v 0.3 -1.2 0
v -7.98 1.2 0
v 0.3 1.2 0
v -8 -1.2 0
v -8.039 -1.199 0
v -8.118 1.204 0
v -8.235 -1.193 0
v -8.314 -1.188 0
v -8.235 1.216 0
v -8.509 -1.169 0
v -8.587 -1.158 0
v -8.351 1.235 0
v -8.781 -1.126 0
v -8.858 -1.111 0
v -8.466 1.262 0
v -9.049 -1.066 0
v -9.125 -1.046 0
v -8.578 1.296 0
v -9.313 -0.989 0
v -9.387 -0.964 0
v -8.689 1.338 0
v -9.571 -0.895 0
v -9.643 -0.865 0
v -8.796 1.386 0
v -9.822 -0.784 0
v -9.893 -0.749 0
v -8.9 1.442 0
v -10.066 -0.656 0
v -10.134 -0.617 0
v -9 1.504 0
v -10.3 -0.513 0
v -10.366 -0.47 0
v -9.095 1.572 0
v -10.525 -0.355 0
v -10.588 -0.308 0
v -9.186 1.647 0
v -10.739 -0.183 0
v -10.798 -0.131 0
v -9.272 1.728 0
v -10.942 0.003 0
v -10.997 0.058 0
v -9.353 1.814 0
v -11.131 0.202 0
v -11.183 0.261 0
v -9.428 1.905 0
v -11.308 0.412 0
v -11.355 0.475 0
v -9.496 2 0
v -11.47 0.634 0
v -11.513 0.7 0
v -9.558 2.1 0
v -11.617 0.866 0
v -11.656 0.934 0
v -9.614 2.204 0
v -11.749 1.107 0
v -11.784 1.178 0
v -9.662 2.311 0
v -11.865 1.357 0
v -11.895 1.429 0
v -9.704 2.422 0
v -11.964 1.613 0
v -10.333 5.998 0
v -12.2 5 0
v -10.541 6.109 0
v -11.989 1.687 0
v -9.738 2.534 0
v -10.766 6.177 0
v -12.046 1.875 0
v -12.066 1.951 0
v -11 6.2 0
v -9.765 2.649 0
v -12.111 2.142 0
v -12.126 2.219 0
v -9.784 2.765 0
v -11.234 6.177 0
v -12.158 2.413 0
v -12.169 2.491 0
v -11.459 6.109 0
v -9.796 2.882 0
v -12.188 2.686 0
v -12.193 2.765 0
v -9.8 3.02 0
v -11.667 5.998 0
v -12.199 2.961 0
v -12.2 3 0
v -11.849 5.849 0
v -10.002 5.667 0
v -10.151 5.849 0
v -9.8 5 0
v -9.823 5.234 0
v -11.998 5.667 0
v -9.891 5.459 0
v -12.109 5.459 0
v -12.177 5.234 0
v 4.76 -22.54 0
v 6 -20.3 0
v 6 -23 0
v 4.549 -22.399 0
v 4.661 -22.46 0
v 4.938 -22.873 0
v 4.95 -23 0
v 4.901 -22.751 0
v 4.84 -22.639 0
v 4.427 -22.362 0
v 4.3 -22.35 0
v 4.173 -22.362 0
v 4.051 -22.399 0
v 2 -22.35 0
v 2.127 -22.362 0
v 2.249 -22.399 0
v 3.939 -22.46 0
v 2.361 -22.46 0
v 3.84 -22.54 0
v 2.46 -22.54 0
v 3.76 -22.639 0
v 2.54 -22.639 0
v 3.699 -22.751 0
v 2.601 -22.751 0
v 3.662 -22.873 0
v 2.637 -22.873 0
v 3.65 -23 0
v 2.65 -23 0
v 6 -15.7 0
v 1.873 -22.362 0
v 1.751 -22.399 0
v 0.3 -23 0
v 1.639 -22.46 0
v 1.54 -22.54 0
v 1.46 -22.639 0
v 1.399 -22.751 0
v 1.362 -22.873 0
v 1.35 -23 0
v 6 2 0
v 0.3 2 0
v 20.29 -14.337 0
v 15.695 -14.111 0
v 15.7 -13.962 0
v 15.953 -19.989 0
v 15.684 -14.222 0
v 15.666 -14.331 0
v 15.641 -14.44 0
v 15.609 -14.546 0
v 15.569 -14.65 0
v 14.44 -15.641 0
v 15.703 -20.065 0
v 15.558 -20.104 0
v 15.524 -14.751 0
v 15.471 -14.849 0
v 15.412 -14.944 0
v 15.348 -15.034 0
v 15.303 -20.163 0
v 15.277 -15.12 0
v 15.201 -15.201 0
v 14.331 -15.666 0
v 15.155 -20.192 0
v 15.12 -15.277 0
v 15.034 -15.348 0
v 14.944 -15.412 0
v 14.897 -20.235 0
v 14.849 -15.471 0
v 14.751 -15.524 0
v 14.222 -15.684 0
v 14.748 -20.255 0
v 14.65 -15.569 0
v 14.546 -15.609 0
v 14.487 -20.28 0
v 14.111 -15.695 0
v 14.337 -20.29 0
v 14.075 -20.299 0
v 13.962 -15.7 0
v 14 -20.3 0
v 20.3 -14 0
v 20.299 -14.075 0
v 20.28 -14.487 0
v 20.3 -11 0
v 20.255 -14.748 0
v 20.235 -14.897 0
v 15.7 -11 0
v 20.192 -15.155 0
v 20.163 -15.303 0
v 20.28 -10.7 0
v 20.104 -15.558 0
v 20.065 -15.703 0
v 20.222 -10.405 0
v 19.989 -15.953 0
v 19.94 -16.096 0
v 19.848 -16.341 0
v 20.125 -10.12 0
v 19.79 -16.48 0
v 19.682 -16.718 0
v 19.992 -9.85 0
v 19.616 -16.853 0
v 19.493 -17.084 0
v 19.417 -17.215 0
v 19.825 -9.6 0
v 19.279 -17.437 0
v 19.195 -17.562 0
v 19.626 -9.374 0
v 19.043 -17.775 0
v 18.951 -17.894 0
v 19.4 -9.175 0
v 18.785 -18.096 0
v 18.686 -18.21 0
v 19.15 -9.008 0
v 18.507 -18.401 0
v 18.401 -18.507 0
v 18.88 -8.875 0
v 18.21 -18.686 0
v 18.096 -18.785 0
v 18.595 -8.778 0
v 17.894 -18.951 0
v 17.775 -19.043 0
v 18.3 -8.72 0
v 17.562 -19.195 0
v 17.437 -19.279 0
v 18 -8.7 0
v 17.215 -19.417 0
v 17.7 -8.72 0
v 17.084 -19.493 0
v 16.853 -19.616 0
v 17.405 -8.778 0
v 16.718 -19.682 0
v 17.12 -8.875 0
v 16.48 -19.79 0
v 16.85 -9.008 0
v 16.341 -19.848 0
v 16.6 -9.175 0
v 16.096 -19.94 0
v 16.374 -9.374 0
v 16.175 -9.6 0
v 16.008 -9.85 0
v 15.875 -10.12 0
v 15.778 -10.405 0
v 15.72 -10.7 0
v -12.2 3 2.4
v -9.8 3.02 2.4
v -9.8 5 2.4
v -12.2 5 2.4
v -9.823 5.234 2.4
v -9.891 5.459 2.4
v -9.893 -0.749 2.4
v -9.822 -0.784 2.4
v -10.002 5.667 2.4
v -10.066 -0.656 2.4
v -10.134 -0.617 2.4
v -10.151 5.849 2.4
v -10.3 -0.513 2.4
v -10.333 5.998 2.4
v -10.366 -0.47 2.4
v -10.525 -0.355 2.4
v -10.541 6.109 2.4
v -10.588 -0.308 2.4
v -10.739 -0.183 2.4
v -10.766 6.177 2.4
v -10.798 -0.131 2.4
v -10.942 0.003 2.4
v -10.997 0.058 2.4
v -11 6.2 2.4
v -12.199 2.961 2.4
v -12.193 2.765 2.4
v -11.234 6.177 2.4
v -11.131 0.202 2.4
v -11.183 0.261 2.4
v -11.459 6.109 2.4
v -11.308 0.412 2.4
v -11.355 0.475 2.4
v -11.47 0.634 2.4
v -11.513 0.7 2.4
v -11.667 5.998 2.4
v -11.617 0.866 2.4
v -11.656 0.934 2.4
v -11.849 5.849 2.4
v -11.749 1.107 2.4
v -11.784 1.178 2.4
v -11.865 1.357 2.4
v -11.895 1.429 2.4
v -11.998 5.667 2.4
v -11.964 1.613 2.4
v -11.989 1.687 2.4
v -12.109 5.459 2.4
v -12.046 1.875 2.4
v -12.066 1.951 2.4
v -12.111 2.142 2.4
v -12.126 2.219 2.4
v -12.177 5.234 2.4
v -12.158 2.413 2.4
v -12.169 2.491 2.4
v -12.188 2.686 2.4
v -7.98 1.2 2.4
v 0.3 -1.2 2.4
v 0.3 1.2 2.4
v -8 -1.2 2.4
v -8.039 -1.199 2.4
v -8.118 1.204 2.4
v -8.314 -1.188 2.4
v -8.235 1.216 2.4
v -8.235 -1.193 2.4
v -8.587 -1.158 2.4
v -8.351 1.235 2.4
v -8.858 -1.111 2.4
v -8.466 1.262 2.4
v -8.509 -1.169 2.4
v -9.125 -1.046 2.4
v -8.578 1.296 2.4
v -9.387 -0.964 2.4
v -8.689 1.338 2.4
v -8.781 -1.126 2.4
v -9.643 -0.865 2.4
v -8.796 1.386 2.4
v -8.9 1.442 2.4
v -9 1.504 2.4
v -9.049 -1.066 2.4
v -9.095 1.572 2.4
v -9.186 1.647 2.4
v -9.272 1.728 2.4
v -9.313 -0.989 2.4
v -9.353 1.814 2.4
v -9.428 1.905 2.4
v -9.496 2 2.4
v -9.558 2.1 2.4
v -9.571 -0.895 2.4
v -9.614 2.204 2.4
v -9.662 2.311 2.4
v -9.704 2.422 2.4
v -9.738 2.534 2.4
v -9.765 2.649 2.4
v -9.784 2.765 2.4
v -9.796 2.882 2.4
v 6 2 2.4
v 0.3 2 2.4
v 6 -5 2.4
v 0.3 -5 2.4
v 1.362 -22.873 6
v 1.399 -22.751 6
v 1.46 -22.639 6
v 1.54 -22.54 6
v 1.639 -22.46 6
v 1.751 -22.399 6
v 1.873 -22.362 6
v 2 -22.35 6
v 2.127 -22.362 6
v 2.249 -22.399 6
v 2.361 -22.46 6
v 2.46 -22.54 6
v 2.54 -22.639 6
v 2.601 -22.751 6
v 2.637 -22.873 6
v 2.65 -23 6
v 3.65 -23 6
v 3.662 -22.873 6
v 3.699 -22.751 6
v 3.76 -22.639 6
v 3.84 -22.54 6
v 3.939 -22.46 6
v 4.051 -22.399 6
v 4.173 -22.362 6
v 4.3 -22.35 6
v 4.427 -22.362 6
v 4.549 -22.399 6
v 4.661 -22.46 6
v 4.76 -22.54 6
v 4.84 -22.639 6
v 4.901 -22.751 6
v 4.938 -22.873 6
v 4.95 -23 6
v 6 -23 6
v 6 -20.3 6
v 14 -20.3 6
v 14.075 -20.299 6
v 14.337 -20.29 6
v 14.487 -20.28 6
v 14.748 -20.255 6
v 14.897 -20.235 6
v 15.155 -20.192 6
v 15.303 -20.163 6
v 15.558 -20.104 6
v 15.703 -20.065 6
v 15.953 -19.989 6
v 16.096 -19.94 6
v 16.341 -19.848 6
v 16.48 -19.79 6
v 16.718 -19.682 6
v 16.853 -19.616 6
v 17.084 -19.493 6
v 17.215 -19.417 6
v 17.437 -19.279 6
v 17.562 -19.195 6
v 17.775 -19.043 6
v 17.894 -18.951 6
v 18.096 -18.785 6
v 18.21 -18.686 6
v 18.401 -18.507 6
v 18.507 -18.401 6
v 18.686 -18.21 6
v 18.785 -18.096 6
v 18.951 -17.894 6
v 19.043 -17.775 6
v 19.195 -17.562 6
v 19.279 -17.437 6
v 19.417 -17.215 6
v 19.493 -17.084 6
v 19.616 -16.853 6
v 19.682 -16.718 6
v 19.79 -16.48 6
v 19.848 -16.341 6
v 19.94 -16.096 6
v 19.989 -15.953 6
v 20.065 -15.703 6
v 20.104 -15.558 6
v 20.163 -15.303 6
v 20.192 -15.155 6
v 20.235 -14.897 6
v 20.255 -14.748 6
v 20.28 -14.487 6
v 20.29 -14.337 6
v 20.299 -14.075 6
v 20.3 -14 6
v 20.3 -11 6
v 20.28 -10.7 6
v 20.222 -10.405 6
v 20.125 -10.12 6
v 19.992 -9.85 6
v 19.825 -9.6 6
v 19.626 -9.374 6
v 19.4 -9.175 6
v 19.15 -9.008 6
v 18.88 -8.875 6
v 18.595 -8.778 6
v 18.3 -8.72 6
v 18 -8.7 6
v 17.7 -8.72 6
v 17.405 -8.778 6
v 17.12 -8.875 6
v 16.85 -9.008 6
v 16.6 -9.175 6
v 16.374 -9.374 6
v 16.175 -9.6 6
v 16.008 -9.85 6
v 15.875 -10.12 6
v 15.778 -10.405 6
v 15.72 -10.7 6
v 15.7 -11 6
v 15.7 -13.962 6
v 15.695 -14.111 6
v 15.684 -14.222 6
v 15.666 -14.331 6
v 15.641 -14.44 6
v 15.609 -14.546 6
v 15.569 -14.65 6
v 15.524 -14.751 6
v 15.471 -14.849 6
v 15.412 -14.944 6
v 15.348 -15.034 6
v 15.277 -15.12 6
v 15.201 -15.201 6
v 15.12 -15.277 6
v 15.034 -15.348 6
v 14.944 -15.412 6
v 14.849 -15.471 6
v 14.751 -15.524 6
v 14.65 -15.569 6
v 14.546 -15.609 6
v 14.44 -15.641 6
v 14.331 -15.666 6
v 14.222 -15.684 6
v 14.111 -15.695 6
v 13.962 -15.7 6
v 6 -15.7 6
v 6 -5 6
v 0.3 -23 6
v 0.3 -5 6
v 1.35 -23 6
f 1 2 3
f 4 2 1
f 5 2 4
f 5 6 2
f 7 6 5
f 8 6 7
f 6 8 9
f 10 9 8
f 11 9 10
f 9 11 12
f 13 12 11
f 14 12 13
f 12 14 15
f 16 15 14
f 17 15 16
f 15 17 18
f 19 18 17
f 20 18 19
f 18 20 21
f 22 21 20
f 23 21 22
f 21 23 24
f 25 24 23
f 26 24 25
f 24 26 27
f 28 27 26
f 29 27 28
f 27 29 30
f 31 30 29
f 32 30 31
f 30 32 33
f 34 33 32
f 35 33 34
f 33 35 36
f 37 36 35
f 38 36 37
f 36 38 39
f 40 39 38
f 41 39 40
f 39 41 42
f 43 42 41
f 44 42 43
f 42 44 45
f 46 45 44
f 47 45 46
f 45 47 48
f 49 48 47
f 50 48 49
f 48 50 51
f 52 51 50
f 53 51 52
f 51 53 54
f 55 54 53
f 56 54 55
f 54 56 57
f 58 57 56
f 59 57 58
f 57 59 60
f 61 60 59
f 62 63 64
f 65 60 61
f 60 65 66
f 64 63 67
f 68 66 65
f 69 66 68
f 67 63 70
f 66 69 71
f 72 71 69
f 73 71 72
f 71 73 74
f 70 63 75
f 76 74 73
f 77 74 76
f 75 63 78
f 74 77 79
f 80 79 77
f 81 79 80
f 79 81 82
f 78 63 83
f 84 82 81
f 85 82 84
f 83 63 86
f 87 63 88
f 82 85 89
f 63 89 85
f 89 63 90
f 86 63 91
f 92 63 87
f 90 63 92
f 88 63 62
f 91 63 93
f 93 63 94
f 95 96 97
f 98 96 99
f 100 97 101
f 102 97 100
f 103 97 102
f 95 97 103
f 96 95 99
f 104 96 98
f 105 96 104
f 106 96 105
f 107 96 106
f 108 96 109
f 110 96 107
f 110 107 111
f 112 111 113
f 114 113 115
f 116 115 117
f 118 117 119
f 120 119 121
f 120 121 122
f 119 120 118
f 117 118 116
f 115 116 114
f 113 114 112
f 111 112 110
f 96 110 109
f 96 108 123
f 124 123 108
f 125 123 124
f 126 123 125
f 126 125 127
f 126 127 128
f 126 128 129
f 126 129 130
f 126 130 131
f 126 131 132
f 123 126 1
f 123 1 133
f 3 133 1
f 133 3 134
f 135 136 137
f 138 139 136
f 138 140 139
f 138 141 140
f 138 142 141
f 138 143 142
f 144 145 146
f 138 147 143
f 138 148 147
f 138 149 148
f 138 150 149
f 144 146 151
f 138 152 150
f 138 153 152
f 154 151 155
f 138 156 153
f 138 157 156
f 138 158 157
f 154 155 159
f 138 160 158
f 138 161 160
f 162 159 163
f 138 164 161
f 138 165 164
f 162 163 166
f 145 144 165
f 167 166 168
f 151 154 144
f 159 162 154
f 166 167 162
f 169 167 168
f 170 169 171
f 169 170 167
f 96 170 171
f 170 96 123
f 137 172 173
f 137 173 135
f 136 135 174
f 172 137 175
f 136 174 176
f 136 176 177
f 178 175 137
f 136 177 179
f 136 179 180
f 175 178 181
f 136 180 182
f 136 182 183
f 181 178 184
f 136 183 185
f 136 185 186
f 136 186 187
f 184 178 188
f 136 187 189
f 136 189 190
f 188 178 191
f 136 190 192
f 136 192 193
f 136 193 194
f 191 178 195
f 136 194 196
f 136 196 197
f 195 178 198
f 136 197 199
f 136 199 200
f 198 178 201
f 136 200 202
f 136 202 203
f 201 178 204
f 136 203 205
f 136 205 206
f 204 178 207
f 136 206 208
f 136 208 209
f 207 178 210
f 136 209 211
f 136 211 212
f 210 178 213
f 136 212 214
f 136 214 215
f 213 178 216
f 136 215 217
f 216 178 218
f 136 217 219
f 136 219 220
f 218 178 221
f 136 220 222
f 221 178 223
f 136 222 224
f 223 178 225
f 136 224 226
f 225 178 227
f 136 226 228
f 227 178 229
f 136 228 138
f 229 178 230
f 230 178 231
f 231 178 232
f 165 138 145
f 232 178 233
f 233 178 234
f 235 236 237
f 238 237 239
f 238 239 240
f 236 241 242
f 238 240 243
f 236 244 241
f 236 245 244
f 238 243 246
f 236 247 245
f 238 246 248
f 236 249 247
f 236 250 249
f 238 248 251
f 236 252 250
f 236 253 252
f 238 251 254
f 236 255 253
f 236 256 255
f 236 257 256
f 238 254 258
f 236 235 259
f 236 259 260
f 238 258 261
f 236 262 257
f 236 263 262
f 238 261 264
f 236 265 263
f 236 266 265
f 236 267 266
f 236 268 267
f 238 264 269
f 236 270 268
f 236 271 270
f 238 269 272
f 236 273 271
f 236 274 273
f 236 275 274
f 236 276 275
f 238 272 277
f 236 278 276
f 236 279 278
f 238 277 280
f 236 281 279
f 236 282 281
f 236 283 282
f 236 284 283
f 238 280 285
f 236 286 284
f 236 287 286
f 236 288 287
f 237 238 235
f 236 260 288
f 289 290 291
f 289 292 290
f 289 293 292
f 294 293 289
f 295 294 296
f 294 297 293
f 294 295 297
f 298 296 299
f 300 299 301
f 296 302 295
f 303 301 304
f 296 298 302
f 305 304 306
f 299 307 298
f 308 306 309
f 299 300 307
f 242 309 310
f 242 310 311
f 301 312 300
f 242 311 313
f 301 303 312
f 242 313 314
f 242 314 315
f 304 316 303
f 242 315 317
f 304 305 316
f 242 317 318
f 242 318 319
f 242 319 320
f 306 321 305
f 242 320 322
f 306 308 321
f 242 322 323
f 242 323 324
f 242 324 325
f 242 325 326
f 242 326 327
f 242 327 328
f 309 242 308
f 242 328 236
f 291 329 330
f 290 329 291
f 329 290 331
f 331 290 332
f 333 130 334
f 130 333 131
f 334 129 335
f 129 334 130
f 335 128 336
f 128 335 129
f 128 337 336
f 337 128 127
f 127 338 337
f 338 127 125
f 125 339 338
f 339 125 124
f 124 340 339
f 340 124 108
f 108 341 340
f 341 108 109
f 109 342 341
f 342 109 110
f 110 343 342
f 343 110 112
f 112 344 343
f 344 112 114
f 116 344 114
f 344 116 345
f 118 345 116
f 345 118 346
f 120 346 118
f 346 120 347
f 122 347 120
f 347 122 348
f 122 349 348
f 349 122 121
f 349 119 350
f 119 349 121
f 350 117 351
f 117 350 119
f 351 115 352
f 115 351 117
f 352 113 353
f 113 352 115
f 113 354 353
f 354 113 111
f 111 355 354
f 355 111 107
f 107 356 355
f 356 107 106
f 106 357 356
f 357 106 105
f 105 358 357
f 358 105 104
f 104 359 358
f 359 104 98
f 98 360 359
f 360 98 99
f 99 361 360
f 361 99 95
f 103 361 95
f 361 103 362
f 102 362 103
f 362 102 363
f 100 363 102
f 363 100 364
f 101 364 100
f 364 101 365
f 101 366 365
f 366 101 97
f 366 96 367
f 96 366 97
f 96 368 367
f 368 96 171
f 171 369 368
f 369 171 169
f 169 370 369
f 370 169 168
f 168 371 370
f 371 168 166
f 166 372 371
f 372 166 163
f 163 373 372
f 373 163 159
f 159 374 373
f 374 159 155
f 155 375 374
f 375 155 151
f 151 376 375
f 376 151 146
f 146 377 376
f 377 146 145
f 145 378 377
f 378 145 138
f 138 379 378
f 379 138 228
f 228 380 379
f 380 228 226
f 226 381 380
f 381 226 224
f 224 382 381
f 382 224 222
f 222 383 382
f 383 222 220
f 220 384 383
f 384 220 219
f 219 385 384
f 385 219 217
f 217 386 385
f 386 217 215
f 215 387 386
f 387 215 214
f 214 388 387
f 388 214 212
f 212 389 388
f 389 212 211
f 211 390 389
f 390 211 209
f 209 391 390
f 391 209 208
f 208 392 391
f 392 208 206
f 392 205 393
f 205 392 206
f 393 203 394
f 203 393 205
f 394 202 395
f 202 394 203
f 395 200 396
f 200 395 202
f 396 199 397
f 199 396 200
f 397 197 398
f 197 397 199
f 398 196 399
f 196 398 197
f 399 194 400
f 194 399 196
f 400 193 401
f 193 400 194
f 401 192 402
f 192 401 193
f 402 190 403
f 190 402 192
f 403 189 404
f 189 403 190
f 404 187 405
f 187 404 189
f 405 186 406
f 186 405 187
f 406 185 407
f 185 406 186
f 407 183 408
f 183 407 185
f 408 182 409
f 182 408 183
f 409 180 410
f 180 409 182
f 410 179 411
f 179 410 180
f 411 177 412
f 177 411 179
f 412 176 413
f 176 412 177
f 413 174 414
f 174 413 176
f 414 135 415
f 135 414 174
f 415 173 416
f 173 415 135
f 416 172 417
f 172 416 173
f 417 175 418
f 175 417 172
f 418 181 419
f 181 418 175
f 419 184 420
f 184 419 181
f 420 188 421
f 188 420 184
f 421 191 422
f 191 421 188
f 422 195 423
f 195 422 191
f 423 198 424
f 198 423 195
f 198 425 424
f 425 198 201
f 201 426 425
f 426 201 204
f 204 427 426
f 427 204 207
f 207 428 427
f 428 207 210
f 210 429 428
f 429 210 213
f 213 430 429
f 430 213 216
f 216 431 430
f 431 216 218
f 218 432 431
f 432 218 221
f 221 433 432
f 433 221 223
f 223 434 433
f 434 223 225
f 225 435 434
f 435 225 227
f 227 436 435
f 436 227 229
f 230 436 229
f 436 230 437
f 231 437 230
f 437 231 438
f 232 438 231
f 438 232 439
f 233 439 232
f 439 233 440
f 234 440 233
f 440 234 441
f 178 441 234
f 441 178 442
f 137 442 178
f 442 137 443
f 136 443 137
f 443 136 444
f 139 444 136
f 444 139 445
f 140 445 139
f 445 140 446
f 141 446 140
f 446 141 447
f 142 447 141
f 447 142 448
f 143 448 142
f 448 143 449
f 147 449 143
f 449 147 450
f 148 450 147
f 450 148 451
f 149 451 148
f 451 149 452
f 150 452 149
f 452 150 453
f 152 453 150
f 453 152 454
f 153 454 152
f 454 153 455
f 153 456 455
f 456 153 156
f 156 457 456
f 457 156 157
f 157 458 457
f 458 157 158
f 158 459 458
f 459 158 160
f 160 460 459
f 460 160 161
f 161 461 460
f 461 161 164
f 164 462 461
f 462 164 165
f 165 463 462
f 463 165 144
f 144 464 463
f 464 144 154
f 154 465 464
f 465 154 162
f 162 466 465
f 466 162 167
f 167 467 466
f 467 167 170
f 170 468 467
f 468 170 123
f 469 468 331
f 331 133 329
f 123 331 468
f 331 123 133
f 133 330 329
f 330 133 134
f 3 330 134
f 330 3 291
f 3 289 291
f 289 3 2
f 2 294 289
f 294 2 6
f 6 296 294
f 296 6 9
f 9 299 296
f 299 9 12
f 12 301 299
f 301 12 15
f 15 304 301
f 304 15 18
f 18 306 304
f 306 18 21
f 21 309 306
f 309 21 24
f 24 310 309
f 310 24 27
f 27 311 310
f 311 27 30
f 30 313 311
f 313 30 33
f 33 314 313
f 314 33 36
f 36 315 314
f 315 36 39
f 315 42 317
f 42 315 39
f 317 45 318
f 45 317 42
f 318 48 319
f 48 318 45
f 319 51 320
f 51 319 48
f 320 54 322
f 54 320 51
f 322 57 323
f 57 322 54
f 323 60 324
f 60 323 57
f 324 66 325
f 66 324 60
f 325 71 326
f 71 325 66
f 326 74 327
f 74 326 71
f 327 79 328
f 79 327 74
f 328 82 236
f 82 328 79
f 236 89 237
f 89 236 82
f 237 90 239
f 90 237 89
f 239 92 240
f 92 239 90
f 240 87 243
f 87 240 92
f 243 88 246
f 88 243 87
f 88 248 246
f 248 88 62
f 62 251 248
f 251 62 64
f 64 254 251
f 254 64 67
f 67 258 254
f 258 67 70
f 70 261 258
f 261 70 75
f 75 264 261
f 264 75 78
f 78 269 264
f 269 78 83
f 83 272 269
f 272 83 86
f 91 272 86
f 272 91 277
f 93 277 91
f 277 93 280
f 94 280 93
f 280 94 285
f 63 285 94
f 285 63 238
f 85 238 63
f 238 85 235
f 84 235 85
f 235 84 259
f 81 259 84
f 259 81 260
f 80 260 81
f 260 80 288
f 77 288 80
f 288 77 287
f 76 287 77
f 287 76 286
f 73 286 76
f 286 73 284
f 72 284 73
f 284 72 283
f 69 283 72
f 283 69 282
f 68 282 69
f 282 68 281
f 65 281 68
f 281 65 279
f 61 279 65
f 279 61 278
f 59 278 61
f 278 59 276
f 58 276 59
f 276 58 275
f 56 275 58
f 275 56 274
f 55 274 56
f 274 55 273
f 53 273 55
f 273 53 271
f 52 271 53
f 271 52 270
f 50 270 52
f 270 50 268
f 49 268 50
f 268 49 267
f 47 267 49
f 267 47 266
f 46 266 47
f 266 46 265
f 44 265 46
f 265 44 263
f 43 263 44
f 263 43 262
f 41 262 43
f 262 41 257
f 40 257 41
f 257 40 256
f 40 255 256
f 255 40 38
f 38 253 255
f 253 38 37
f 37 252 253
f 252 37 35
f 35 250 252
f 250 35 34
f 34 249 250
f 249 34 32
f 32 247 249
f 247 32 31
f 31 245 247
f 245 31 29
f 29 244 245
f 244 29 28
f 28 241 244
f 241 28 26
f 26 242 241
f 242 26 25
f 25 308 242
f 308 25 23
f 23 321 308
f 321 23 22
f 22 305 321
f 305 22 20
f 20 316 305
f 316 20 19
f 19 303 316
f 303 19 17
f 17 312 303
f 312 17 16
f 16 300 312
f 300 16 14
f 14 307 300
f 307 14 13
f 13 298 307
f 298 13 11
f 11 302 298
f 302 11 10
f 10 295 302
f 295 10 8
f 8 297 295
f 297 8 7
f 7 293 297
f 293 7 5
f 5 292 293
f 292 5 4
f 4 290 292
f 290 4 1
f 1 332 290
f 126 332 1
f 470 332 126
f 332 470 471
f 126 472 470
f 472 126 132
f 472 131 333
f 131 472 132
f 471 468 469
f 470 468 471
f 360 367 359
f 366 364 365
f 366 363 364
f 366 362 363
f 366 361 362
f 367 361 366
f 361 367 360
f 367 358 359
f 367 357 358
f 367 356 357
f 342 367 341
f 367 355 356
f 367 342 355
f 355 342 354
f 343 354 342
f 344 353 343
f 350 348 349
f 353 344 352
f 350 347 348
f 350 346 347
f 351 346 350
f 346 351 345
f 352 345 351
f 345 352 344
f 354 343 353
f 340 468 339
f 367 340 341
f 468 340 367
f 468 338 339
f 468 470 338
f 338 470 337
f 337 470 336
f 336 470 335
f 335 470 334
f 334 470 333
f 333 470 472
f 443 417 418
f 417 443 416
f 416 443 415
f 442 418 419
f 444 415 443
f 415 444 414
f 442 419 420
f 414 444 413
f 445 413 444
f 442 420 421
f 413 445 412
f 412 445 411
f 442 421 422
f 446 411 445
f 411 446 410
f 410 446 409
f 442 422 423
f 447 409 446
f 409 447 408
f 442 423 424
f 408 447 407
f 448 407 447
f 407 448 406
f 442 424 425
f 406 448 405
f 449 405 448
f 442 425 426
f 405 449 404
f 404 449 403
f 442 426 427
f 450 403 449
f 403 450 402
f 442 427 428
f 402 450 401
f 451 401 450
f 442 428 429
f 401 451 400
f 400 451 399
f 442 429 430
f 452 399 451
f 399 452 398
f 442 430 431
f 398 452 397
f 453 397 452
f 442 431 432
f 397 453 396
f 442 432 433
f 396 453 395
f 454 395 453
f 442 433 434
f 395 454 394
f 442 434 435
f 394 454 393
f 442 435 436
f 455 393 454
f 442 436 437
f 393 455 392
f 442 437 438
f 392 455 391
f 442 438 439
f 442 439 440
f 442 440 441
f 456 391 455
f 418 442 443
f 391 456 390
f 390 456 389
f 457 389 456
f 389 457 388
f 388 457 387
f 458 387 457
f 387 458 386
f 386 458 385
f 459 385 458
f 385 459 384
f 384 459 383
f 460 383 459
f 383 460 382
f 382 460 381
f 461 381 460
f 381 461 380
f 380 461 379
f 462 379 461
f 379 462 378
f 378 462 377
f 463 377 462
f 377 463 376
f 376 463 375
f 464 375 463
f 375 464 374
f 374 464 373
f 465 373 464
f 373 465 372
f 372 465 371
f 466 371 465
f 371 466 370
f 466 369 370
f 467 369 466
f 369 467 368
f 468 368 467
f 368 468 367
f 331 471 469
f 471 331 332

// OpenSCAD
// Experimental key hook. Side-down print. mm. No verified load rating.
union(){
linear_extrude(height=2.4) polygon(points=[[14.331413174985244, -15.666126542813972], [14.439673483531255, -15.640883779279488], [14.546051042720913, -15.60861449948906], [14.650090327514404, -15.569456885452816], [14.75134582572176, -15.52357861608567], [14.84938394575467, -15.471176149180398], [14.943784873332051, -15.412473880145273], [15.034144369189349, -15.347723181108421], [15.120075500093066, -15.277201324503821], [15.201210295748218, -15.201210295748218], [15.277201324503821, -15.120075500093066], [15.347723181108421, -15.034144369189349], [15.412473880145273, -14.943784873332051], [15.471176149180396, -14.849383945754672], [15.523578616085675, -14.751345825721748], [15.56945688545281, -14.650090327514416], [15.608614499489052, -14.546051042720931], [15.640883779279486, -14.43967348353125], [15.666126542813974, -14.33141317498523], [15.684234696703742, -14.221733704344393], [15.69513069905381, -14.11110473594039], [15.7, -13.962362979088814], [15.7, -11.0], [15.719676818840236, -10.699789757893882], [15.778370599535144, -10.404716196264202], [15.875077075224041, -10.119828105560293], [16.00814157129579, -9.85], [16.17528731733016, -9.599848713279941], [16.37365440327094, -9.37365440327094], [16.599848713279943, -9.17528731733016], [16.85, -9.008141571295791], [17.119828105560295, -8.875077075224041], [17.404716196264204, -8.778370599535144], [17.699789757893882, -8.719676818840236], [18.0, -8.7], [18.300210242106118, -8.719676818840236], [18.595283803735796, -8.778370599535144], [18.880171894439705, -8.875077075224041], [19.15, -9.008141571295791], [19.400151286720057, -9.17528731733016], [19.62634559672906, -9.37365440327094], [19.82471268266984, -9.599848713279943], [19.99185842870421, -9.85], [20.12492292477596, -10.119828105560293], [20.221629400464856, -10.404716196264202], [20.280323181159766, -10.69978975789388], [20.3, -11.0], [20.3, -14.0], [20.298768551195643, -14.075253890490078], [20.290204244150054, -14.336866407410652], [20.280360564300466, -14.487051939678583], [20.25470431684129, -14.747544191638216], [20.235059109290464, -14.896764357687747], [20.192420785408146, -15.155020876872054], [20.163058173950784, -15.30263669304359], [20.103620357494133, -15.55755158538916], [20.064666077340355, -15.702930938095339], [19.988683290164502, -15.953412618897902], [19.940304149522277, -16.09593297143147], [19.848101761587003, -16.34090883967918], [19.790504927363845, -16.47995989801048], [19.682477763449448, -16.71838092942613], [19.61590987413197, -16.853367255575797], [19.49252052313897, -17.08421249469979], [19.417266632648882, -17.214556056495848], [19.27904346672131, -17.436836988574257], [19.195425823770893, -17.561979634874355], [19.042960735725654, -17.774744418830828], [18.95133740389925, -17.894150269611252], [18.78528327265022, -18.096487813976648], [18.68604659712094, -18.209645555052873], [18.50711449195122, -18.400689419398788], [18.400689419398788, -18.50711449195122], [18.209645555052873, -18.68604659712094], [18.096487813976648, -18.78528327265022], [17.894150269611252, -18.95133740389925], [17.774744418830828, -19.042960735725654], [17.561979634874355, -19.195425823770893], [17.436836988574257, -19.27904346672131], [17.214556056495848, -19.417266632648882], [17.08421249469981, -19.492520523138964], [16.853367255575815, -19.615909874131965], [16.718380929426107, -19.682477763449462], [16.47995989801046, -19.790504927363855], [16.34090883967918, -19.848101761587003], [16.09593297143147, -19.940304149522277], [15.95341261889793, -19.988683290164495], [15.702930938095367, -20.06466607734035], [15.55755158538913, -20.103620357494144], [15.30263669304356, -20.16305817395079], [15.155020876872054, -20.192420785408146], [14.896764357687747, -20.235059109290464], [14.747544191638214, -20.25470431684129], [14.48705193967858, -20.280360564300466], [14.33686640741065, -20.290204244150054], [14.075253890490078, -20.298768551195643], [14.0, -20.3], [6.0, -20.3], [6.0, -23.0], [4.95, -23.0], [4.9375104322620995, -22.873191290689515], [4.900521696132336, -22.75125576896269], [4.840455247996655, -22.63887934853726], [4.759619407771256, -22.540380592228743], [4.661120651462741, -22.459544752003346], [4.5487442310373085, -22.399478303867664], [4.4268087093104835, -22.3624895677379], [4.3, -22.35], [4.173191290689516, -22.3624895677379], [4.051255768962691, -22.399478303867664], [3.9388793485372586, -22.459544752003346], [3.840380592228744, -22.540380592228743], [3.7595447520033454, -22.63887934853726], [3.6994783038676635, -22.751255768962693], [3.6624895677379, -22.873191290689515], [3.65, -23.0], [2.65, -23.0], [2.6375104322620997, -22.873191290689515], [2.6005216961323363, -22.75125576896269], [2.5404552479966545, -22.63887934853726], [2.459619407771256, -22.540380592228743], [2.361120651462741, -22.459544752003346], [2.2487442310373087, -22.399478303867664], [2.1268087093104833, -22.3624895677379], [1.9999999999999998, -22.35], [1.8731912906895163, -22.3624895677379], [1.7512557689626913, -22.399478303867664], [1.6388793485372586, -22.459544752003346], [1.5403805922287441, -22.540380592228743], [1.4595447520033455, -22.63887934853726], [1.3994783038676635, -22.751255768962693], [1.3624895677379003, -22.873191290689515], [1.35, -23.0], [0.3, -23.0], [0.3, -17.0], [0.3, -5.0], [0.3, -1.2], [-8.0, -1.2], [-8.039262899386133, -1.1993575049716385], [-8.235472287076561, -1.1929342746874487], [-8.3138299560859, -1.1877984417224465], [-8.509199145055627, -1.1685562561280673], [-8.587053144733662, -1.1583065826232855], [-8.780745534121891, -1.1263278397115457], [-8.857762481689628, -1.1110082163424924], [-9.048948650948807, -1.0664298540000061], [-9.12479874801292, -1.046105881745855], [-9.312660008614841, -0.989118791363967], [-9.387018453414969, -0.9638775005941067], [-9.570750354600753, -0.8947257096426497], [-9.643298732860536, -0.8646751874392735], [-9.822114506422272, -0.7836548145034787], [-9.892542154848204, -0.7489237418160897], [-10.0656760841912, -0.6563817285713405], [-10.13368142078044, -0.6171188291852114], [-10.300392119839248, -0.513451454739531], [-10.36568393530017, -0.46982485841757393], [-10.525257523267525, -0.35547604238364405], [-10.587556228022539, -0.30767256490898875], [-10.739309386296583, -0.18313196647221563], [-10.798348207727653, -0.13135630967433454], [-10.941631105987089, 0.002842769202955231], [-10.99715723079704, 0.05836889401290646], [-11.13135630967433, 0.2016517922723423], [-11.183131966472217, 0.2606906137034185], [-11.30767256490899, 0.4124437719774635], [-11.35547604238365, 0.4747424767324827], [-11.469824858417578, 0.6343160646998375], [-11.513451454739526, 0.6996078801607467], [-11.617118829185207, 0.8663185792195535], [-11.656381728571342, 0.9343239158088013], [-11.74892374181609, 1.1074578451517973], [-11.783654814503478, 1.1778854935777257], [-11.864675187439273, 1.3567012671394605], [-11.89472570964265, 1.4292496453992485], [-11.963877500594107, 1.6129815465850328], [-11.989118791363968, 1.6873399913851581], [-12.046105881745856, 1.8752012519870802], [-12.066429854000006, 1.9510513490511916], [-12.111008216342492, 2.14223751831037], [-12.126327839711546, 2.2192544658781093], [-12.158306582623286, 2.412946855266339], [-12.168556256128067, 2.4908008549443728], [-12.187798441722446, 2.6861700439140983], [-12.192934274687449, 2.7645277129234374], [-12.199357504971639, 2.960737100613867], [-12.2, 3.0], [-12.2, 5.0], [-12.176942336483876, 5.234108386419354], [-12.108655439013544, 5.4592201188381075], [-11.997763534763054, 5.666684279623523], [-11.848528137423857, 5.848528137423857], [-11.666684279623523, 5.997763534763054], [-11.459220118838108, 6.108655439013544], [-11.234108386419354, 6.176942336483877], [-11.0, 6.2], [-10.765891613580646, 6.176942336483877], [-10.540779881161892, 6.108655439013544], [-10.333315720376477, 5.997763534763054], [-10.151471862576143, 5.848528137423857], [-10.002236465236946, 5.666684279623523], [-9.891344560986456, 5.4592201188381075], [-9.823057663516124, 5.234108386419354], [-9.8, 5.0], [-9.8, 3.019636706562397], [-9.795504598985058, 2.8823164110818267], [-9.783963410838911, 2.7651367613585367], [-9.764783017488503, 2.6489628320799428], [-9.738045552322793, 2.5342920978466092], [-9.703865509272424, 2.4216155963470474], [-9.66238925252917, 2.311415825659156], [-9.613794389791934, 2.2041646781191235], [-9.55828901172339, 2.1003214196062565], [-9.49611080087377, 2.000330722895815], [-9.427526013887695, 1.9046207635019419], [-9.352828341352376, 1.8136013861644398], [-9.2723376501694, 1.727662349830608], [-9.186398613835562, 1.6471716586476266], [-9.095379236498058, 1.572473986112305], [-8.999669277104188, 1.503889199126231], [-8.89967858039373, 1.4417109882766026], [-8.795835321880874, 1.3862056102080647], [-8.68858417434086, 1.3376107474708359], [-8.578384403652931, 1.296134490727569], [-8.4657079021534, 1.2619544476772075], [-8.351037167920055, 1.235216982511497], [-8.234863238641475, 1.2160365891610905], [-8.117683588918164, 1.2044954010149407], [-7.980363293437629, 1.2], [0.3, 1.2], [0.3, 2.0], [6.0, 2.0], [6.0, -5.0], [6.0, -15.7], [13.962362979088812, -15.7], [14.111104735940392, -15.69513069905381], [14.221733704344391, -15.684234696703742], [14.331413174985244, -15.666126542813972]]);
translate([0,0,2.3]) linear_extrude(height=3.7) polygon(points=[[14.439673483531255, -15.640883779279488], [14.546051042720913, -15.60861449948906], [14.650090327514404, -15.569456885452816], [14.75134582572176, -15.52357861608567], [14.84938394575467, -15.471176149180398], [14.943784873332051, -15.412473880145273], [15.034144369189349, -15.347723181108421], [15.120075500093066, -15.277201324503821], [15.201210295748218, -15.201210295748218], [15.277201324503821, -15.120075500093066], [15.347723181108421, -15.034144369189349], [15.412473880145273, -14.943784873332051], [15.471176149180396, -14.849383945754672], [15.523578616085675, -14.751345825721748], [15.56945688545281, -14.650090327514416], [15.608614499489052, -14.546051042720931], [15.640883779279486, -14.43967348353125], [15.666126542813974, -14.33141317498523], [15.684234696703742, -14.221733704344393], [15.69513069905381, -14.11110473594039], [15.7, -13.962362979088814], [15.7, -11.0], [15.719676818840236, -10.699789757893882], [15.778370599535144, -10.404716196264202], [15.875077075224041, -10.119828105560293], [16.00814157129579, -9.85], [16.17528731733016, -9.599848713279941], [16.37365440327094, -9.37365440327094], [16.599848713279943, -9.17528731733016], [16.85, -9.008141571295791], [17.119828105560295, -8.875077075224041], [17.404716196264204, -8.778370599535144], [17.699789757893882, -8.719676818840236], [18.0, -8.7], [18.300210242106118, -8.719676818840236], [18.595283803735796, -8.778370599535144], [18.880171894439705, -8.875077075224041], [19.15, -9.008141571295791], [19.400151286720057, -9.17528731733016], [19.62634559672906, -9.37365440327094], [19.82471268266984, -9.599848713279943], [19.99185842870421, -9.85], [20.12492292477596, -10.119828105560293], [20.221629400464856, -10.404716196264202], [20.280323181159766, -10.69978975789388], [20.3, -11.0], [20.3, -14.0], [20.298768551195643, -14.075253890490078], [20.290204244150054, -14.336866407410652], [20.280360564300466, -14.487051939678583], [20.25470431684129, -14.747544191638216], [20.235059109290464, -14.896764357687747], [20.192420785408146, -15.155020876872054], [20.163058173950784, -15.30263669304359], [20.103620357494133, -15.55755158538916], [20.064666077340355, -15.702930938095339], [19.988683290164502, -15.953412618897902], [19.940304149522277, -16.09593297143147], [19.848101761587003, -16.34090883967918], [19.790504927363845, -16.47995989801048], [19.682477763449448, -16.71838092942613], [19.61590987413197, -16.853367255575797], [19.49252052313897, -17.08421249469979], [19.417266632648882, -17.214556056495848], [19.27904346672131, -17.436836988574257], [19.195425823770893, -17.561979634874355], [19.042960735725654, -17.774744418830828], [18.95133740389925, -17.894150269611252], [18.78528327265022, -18.096487813976648], [18.68604659712094, -18.209645555052873], [18.50711449195122, -18.400689419398788], [18.400689419398788, -18.50711449195122], [18.209645555052873, -18.68604659712094], [18.096487813976648, -18.78528327265022], [17.894150269611252, -18.95133740389925], [17.774744418830828, -19.042960735725654], [17.561979634874355, -19.195425823770893], [17.436836988574257, -19.27904346672131], [17.214556056495848, -19.417266632648882], [17.08421249469981, -19.492520523138964], [16.853367255575815, -19.615909874131965], [16.718380929426107, -19.682477763449462], [16.47995989801046, -19.790504927363855], [16.34090883967918, -19.848101761587003], [16.09593297143147, -19.940304149522277], [15.95341261889793, -19.988683290164495], [15.702930938095367, -20.06466607734035], [15.55755158538913, -20.103620357494144], [15.30263669304356, -20.16305817395079], [15.155020876872054, -20.192420785408146], [14.896764357687747, -20.235059109290464], [14.747544191638214, -20.25470431684129], [14.48705193967858, -20.280360564300466], [14.33686640741065, -20.290204244150054], [14.075253890490078, -20.298768551195643], [14.0, -20.3], [6.0, -20.3], [6.0, -23.0], [4.95, -23.0], [4.9375104322620995, -22.873191290689515], [4.900521696132336, -22.75125576896269], [4.840455247996655, -22.63887934853726], [4.759619407771256, -22.540380592228743], [4.661120651462741, -22.459544752003346], [4.5487442310373085, -22.399478303867664], [4.4268087093104835, -22.3624895677379], [4.3, -22.35], [4.173191290689516, -22.3624895677379], [4.051255768962691, -22.399478303867664], [3.9388793485372586, -22.459544752003346], [3.840380592228744, -22.540380592228743], [3.7595447520033454, -22.63887934853726], [3.6994783038676635, -22.751255768962693], [3.6624895677379, -22.873191290689515], [3.65, -23.0], [2.65, -23.0], [2.6375104322620997, -22.873191290689515], [2.6005216961323363, -22.75125576896269], [2.5404552479966545, -22.63887934853726], [2.459619407771256, -22.540380592228743], [2.361120651462741, -22.459544752003346], [2.2487442310373087, -22.399478303867664], [2.1268087093104833, -22.3624895677379], [1.9999999999999998, -22.35], [1.8731912906895163, -22.3624895677379], [1.7512557689626913, -22.399478303867664], [1.6388793485372586, -22.459544752003346], [1.5403805922287441, -22.540380592228743], [1.4595447520033455, -22.63887934853726], [1.3994783038676635, -22.751255768962693], [1.3624895677379003, -22.873191290689515], [1.35, -23.0], [0.3, -23.0], [0.3, -17.0], [0.3, -5.0], [6.0, -5.0], [6.0, -15.7], [13.962362979088812, -15.7], [14.111104735940392, -15.69513069905381], [14.221733704344391, -15.684234696703742], [14.331413174985244, -15.666126542813972], [14.439673483531255, -15.640883779279488]]);
}
